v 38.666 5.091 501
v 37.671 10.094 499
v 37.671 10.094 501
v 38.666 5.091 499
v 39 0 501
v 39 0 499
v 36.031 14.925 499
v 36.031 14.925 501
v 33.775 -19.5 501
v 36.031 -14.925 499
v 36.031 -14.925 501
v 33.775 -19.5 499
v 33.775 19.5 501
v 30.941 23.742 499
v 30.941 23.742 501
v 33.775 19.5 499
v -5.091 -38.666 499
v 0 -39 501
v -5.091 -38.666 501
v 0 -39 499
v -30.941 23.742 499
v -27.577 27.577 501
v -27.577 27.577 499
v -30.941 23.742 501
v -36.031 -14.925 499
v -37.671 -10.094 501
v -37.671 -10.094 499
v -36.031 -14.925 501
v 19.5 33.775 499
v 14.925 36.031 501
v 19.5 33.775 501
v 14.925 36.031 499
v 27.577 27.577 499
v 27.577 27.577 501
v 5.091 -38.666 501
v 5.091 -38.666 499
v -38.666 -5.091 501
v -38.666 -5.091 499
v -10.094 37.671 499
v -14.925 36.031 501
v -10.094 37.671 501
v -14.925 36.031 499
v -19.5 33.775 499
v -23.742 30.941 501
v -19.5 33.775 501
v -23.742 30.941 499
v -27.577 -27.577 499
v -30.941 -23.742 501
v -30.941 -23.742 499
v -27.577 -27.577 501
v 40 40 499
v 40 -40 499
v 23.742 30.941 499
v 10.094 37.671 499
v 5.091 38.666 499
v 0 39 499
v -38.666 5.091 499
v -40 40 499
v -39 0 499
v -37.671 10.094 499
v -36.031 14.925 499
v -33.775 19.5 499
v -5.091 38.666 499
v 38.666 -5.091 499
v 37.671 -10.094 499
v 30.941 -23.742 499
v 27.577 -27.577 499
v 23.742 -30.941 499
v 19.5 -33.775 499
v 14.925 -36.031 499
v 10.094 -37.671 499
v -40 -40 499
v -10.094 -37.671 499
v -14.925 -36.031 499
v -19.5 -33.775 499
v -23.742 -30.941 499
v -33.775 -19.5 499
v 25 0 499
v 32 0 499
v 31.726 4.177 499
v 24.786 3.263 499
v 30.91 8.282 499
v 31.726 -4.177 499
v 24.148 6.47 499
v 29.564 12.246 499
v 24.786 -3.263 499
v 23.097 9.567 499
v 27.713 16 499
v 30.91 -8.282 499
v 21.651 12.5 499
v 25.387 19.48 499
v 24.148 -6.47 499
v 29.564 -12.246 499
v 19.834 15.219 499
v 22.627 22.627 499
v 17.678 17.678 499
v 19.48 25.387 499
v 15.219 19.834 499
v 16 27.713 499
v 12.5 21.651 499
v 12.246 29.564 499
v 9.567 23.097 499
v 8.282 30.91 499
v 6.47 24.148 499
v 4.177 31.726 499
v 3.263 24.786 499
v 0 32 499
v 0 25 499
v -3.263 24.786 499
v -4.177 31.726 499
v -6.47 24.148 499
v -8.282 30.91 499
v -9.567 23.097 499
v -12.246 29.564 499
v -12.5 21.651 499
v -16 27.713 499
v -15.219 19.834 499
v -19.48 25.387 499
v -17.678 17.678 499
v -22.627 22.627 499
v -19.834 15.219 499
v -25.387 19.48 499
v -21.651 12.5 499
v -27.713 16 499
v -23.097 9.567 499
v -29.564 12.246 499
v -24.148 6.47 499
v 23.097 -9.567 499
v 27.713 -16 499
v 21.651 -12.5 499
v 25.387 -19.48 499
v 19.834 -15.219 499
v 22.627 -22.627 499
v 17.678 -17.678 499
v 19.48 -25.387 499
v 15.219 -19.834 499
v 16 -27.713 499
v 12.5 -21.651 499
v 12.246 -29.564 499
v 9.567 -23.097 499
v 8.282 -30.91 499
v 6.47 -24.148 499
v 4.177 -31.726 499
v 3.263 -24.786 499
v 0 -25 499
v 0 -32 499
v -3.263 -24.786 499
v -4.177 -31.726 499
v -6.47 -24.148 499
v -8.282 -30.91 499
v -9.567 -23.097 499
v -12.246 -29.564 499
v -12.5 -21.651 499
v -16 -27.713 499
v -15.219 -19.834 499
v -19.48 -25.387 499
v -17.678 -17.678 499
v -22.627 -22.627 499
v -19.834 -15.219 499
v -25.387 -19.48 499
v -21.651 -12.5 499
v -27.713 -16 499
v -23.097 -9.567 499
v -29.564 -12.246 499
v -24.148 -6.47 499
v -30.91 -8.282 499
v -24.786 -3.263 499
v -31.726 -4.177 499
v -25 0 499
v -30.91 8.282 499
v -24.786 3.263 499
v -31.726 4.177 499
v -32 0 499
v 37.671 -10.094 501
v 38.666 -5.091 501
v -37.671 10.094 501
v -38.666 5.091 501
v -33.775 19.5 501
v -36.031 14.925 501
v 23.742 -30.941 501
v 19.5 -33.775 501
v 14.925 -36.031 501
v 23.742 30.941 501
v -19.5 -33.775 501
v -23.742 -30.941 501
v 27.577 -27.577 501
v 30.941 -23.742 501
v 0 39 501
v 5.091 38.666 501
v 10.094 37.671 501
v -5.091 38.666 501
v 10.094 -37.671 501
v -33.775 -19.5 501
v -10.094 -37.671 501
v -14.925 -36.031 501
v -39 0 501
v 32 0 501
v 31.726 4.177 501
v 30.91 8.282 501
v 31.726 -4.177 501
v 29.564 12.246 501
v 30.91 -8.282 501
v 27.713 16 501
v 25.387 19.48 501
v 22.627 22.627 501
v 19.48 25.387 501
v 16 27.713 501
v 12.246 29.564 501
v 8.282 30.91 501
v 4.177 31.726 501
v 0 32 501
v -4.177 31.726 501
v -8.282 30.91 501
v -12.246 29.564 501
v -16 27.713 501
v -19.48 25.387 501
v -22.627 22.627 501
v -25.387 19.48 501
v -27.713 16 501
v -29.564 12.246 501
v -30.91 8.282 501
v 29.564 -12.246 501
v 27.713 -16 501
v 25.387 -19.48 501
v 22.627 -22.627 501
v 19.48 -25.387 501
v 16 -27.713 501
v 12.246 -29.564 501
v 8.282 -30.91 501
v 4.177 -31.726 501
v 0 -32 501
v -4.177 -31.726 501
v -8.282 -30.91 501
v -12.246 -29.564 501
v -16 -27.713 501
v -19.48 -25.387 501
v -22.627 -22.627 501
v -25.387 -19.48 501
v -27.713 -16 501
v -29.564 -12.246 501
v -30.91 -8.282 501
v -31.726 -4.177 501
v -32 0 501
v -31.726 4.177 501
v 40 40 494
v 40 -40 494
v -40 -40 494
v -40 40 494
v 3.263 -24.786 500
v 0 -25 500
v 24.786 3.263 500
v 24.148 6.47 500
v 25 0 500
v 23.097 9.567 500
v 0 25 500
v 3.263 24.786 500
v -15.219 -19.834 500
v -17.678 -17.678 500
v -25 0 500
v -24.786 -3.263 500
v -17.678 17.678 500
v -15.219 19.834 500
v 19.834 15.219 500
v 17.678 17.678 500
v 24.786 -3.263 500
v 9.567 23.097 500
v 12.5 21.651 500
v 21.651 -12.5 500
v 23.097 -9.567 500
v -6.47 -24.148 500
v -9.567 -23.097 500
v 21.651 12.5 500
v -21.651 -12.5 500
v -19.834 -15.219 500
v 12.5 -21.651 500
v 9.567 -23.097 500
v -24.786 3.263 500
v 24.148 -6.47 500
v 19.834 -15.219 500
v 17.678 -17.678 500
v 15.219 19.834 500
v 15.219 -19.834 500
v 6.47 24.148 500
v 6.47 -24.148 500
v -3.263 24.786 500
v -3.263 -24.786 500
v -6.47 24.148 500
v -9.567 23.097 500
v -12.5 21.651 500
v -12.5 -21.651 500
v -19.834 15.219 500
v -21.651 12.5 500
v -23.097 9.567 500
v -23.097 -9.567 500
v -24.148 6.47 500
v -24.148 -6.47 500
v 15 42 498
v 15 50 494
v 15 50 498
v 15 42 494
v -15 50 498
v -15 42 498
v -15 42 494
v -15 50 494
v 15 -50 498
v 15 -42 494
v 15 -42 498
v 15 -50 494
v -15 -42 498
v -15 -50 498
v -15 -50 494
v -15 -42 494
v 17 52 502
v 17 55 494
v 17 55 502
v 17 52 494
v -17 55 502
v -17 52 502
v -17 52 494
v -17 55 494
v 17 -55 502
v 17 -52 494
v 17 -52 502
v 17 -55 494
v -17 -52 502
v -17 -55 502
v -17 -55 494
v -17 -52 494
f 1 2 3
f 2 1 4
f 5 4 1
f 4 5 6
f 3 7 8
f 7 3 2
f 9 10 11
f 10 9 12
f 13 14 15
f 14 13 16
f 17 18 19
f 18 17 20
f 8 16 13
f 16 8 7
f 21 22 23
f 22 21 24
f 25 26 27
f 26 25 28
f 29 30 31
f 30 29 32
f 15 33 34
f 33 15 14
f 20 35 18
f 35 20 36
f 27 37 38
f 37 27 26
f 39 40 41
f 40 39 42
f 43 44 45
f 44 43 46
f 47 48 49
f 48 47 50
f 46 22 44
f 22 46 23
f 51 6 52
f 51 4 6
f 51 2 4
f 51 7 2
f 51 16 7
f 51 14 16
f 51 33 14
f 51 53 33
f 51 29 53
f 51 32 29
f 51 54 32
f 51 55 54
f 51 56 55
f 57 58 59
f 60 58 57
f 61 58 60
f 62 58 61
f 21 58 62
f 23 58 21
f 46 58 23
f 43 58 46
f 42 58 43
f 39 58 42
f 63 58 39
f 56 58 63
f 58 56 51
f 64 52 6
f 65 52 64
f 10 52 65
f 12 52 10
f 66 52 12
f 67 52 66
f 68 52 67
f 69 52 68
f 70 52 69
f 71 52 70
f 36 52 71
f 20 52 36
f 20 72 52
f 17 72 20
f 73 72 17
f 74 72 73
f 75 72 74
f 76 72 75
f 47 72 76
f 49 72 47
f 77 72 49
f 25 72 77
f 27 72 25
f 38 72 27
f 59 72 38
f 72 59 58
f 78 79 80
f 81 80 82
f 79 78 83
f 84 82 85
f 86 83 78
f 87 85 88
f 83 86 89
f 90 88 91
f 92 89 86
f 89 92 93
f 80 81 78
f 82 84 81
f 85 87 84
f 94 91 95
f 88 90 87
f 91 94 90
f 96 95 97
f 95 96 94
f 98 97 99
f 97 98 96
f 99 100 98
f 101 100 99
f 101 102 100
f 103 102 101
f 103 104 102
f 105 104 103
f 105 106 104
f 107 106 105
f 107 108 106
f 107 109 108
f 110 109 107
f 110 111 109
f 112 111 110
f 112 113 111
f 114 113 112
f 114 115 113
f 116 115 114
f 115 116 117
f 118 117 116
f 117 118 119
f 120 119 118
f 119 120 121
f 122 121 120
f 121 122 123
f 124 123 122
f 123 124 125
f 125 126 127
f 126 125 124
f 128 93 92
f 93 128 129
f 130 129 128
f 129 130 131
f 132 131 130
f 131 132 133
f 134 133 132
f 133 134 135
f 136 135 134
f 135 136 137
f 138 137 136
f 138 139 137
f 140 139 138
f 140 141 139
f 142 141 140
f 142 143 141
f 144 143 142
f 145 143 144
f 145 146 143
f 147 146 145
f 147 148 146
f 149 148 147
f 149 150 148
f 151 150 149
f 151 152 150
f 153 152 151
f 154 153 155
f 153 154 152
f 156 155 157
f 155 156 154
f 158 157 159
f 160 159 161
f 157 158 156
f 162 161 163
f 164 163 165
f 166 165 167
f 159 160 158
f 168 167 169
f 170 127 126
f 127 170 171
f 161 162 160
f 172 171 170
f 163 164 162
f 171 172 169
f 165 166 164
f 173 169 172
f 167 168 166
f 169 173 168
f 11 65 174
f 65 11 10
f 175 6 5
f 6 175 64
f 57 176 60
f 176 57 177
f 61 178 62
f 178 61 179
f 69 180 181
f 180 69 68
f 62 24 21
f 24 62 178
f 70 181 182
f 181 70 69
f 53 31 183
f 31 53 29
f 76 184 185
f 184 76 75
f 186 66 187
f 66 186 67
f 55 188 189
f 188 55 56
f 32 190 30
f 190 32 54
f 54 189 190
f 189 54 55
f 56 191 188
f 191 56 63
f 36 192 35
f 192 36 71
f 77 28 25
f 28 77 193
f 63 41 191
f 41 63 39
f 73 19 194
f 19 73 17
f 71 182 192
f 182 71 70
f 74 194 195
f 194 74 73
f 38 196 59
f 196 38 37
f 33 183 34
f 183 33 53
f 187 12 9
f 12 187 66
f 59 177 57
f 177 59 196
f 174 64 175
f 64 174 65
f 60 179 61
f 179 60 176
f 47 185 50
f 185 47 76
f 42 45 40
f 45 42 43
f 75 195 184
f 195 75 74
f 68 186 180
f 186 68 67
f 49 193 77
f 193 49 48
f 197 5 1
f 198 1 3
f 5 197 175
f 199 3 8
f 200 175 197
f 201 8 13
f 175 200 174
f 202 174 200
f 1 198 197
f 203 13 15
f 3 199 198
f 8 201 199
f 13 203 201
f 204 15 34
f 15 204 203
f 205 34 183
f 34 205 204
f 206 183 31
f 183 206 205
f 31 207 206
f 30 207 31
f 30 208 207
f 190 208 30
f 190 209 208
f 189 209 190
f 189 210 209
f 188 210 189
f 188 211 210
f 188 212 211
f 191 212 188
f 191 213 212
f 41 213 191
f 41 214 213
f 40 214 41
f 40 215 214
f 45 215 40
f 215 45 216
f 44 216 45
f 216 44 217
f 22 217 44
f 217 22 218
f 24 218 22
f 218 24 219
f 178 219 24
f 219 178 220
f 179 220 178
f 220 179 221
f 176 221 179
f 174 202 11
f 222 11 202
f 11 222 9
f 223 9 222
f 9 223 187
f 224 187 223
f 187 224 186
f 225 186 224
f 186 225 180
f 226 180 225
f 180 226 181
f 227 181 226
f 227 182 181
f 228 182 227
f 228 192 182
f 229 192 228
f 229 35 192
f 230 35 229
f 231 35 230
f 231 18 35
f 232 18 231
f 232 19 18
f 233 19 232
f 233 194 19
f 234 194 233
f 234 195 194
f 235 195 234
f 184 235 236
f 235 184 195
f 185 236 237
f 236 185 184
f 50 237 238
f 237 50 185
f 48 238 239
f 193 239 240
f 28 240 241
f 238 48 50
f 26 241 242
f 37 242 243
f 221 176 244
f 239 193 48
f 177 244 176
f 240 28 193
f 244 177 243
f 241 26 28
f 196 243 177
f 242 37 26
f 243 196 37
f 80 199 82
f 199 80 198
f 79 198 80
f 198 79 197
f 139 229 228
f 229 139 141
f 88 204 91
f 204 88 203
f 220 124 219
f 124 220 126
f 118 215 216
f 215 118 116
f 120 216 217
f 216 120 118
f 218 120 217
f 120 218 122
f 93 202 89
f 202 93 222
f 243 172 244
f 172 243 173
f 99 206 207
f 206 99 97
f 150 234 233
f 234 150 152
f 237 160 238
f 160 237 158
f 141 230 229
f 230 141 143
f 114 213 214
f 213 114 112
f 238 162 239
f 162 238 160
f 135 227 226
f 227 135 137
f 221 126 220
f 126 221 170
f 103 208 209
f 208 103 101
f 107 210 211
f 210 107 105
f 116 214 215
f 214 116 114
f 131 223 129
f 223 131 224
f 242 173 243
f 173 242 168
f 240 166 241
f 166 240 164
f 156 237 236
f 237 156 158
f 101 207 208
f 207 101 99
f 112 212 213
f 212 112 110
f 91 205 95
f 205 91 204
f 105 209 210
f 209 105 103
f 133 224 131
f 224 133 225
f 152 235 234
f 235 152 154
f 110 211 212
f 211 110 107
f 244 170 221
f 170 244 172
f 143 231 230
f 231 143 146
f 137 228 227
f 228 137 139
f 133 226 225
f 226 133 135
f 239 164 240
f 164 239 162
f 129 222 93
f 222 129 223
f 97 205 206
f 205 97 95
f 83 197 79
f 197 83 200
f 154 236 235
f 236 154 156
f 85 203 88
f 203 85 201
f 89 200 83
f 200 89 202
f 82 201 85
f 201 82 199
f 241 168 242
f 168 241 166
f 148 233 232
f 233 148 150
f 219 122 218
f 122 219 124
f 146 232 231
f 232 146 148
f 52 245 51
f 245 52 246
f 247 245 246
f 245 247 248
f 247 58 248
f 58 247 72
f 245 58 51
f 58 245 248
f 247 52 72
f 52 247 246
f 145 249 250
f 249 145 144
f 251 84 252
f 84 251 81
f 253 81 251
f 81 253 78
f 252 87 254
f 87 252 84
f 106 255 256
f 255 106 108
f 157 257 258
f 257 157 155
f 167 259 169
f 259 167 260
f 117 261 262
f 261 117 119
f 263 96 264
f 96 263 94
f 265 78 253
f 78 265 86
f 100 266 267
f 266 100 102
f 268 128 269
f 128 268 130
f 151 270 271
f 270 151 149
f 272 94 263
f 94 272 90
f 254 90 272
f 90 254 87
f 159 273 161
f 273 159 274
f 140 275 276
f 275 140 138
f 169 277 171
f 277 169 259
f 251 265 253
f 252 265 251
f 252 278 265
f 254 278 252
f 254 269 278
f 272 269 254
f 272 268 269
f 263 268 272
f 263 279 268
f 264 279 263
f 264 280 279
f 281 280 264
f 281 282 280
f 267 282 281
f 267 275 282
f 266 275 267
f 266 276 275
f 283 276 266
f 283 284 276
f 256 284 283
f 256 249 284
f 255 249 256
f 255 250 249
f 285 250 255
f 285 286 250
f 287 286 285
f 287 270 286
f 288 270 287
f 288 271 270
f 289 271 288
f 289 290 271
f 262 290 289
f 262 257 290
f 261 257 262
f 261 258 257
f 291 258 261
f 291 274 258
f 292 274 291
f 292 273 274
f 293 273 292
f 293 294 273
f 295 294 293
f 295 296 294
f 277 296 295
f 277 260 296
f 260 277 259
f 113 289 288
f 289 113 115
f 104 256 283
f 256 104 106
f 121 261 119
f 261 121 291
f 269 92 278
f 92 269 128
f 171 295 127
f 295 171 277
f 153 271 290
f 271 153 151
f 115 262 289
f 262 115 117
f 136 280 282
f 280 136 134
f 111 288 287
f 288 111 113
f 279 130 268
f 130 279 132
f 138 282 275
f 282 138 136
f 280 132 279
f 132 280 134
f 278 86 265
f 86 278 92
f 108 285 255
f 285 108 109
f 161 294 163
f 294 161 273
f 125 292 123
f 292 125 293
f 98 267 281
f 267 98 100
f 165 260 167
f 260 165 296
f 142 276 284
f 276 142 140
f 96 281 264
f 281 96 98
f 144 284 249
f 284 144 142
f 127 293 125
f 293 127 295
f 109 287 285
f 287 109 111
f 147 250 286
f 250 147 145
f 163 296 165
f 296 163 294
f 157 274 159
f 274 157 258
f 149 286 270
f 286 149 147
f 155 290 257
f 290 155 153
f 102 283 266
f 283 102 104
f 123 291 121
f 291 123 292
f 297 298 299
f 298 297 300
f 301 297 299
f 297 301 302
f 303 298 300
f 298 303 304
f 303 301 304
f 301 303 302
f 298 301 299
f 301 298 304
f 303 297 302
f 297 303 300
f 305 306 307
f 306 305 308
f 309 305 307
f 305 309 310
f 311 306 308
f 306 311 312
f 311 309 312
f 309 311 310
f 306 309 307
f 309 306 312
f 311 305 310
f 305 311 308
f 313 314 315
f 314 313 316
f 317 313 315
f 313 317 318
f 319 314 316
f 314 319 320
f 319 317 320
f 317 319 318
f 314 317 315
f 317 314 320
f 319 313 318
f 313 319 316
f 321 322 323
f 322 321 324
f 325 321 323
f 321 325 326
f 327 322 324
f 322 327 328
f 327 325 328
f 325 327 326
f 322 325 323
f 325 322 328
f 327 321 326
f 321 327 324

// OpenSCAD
// Atom Lithography Machine (3.0-exp124-exp125-locked) — S3: IBIC Yonga Algılama & 100 K LTC6268 Ön-Uç (Exp127)
// Drawing No: ALM-300-S3 | Units: mm | Tol: ISO 2768-mK
// Generated by gen_scad.py from params.py — DO NOT EDIT DIRECTLY.
$fn = 48;

module s3_ibic_detector_assembly() {
  // s3_wafer_carrier [S3.1] AlN Yonga Taşıyıcı (80×80×5 mm, Exp80 BC1) (aln_ceramic, ±0.02 mm)
  color([0.769, 0.82, 0.796], 1.0) translate([0.0, 0.0, 496.5])
    cube([80.0, 80.0, 5.0], center=true);
  // s3_silicon_wafer [S5.4] Ø50 mm ²⁸Si/²⁹Si (f=%1) Epitaksiyel Yonga (0 V) (si_mems, ±0.01 mm)
  color([0.173, 0.286, 0.376], 1.0) translate([0.0, 0.0, 499.5])
    cylinder(r=25.0, h=1.0, center=true);
  // s3_ibic_contact_ring [S3.1] BeCu/Au IBIC Kontak Halkası (Ø64/Ø78, WD paylı) (becu, ±0.02 mm)
  color([0.788, 0.604, 0.18], 1.0) translate([0.0, 0.0, 500.0])
    difference() {
      cylinder(r=39.0, h=2.0, center=true);
      cylinder(r=32.0, h=2.4, center=true);
    }
  // s3_ibic_csa_pos [S3.2] 100 K LTC6268 CSA (+Y, ENC=24,1 e⁻, η=0,99936) (fr4_rogers, ±0.05 mm)
  color([0.18, 0.49, 0.322], 1.0) translate([0.0, 46.0, 496.0])
    cube([30.0, 8.0, 4.0], center=true);
  // s3_ibic_csa_neg [S3.2] 100 K LTC6268 CSA (−Y, 1,2 µs / 1 GΩ, Exp127) (fr4_rogers, ±0.05 mm)
  color([0.18, 0.49, 0.322], 1.0) translate([0.0, -46.0, 496.0])
    cube([30.0, 8.0, 4.0], center=true);
  // s3_hv_bias_shield_pos [S3.3] HV Besleme & Faraday Koruma Kalkanı (+Y) (becu, ±0.05 mm)
  color([0.788, 0.604, 0.18], 1.0) translate([0.0, 53.5, 498.0])
    cube([34.0, 3.0, 8.0], center=true);
  // s3_hv_bias_shield_neg [S3.3] HV Besleme & Faraday Koruma Kalkanı (−Y) (becu, ±0.05 mm)
  color([0.788, 0.604, 0.18], 1.0) translate([0.0, -53.5, 498.0])
    cube([34.0, 3.0, 8.0], center=true);
}

// Standalone preview (comment out when `use <...>` imported)
s3_ibic_detector_assembly();
